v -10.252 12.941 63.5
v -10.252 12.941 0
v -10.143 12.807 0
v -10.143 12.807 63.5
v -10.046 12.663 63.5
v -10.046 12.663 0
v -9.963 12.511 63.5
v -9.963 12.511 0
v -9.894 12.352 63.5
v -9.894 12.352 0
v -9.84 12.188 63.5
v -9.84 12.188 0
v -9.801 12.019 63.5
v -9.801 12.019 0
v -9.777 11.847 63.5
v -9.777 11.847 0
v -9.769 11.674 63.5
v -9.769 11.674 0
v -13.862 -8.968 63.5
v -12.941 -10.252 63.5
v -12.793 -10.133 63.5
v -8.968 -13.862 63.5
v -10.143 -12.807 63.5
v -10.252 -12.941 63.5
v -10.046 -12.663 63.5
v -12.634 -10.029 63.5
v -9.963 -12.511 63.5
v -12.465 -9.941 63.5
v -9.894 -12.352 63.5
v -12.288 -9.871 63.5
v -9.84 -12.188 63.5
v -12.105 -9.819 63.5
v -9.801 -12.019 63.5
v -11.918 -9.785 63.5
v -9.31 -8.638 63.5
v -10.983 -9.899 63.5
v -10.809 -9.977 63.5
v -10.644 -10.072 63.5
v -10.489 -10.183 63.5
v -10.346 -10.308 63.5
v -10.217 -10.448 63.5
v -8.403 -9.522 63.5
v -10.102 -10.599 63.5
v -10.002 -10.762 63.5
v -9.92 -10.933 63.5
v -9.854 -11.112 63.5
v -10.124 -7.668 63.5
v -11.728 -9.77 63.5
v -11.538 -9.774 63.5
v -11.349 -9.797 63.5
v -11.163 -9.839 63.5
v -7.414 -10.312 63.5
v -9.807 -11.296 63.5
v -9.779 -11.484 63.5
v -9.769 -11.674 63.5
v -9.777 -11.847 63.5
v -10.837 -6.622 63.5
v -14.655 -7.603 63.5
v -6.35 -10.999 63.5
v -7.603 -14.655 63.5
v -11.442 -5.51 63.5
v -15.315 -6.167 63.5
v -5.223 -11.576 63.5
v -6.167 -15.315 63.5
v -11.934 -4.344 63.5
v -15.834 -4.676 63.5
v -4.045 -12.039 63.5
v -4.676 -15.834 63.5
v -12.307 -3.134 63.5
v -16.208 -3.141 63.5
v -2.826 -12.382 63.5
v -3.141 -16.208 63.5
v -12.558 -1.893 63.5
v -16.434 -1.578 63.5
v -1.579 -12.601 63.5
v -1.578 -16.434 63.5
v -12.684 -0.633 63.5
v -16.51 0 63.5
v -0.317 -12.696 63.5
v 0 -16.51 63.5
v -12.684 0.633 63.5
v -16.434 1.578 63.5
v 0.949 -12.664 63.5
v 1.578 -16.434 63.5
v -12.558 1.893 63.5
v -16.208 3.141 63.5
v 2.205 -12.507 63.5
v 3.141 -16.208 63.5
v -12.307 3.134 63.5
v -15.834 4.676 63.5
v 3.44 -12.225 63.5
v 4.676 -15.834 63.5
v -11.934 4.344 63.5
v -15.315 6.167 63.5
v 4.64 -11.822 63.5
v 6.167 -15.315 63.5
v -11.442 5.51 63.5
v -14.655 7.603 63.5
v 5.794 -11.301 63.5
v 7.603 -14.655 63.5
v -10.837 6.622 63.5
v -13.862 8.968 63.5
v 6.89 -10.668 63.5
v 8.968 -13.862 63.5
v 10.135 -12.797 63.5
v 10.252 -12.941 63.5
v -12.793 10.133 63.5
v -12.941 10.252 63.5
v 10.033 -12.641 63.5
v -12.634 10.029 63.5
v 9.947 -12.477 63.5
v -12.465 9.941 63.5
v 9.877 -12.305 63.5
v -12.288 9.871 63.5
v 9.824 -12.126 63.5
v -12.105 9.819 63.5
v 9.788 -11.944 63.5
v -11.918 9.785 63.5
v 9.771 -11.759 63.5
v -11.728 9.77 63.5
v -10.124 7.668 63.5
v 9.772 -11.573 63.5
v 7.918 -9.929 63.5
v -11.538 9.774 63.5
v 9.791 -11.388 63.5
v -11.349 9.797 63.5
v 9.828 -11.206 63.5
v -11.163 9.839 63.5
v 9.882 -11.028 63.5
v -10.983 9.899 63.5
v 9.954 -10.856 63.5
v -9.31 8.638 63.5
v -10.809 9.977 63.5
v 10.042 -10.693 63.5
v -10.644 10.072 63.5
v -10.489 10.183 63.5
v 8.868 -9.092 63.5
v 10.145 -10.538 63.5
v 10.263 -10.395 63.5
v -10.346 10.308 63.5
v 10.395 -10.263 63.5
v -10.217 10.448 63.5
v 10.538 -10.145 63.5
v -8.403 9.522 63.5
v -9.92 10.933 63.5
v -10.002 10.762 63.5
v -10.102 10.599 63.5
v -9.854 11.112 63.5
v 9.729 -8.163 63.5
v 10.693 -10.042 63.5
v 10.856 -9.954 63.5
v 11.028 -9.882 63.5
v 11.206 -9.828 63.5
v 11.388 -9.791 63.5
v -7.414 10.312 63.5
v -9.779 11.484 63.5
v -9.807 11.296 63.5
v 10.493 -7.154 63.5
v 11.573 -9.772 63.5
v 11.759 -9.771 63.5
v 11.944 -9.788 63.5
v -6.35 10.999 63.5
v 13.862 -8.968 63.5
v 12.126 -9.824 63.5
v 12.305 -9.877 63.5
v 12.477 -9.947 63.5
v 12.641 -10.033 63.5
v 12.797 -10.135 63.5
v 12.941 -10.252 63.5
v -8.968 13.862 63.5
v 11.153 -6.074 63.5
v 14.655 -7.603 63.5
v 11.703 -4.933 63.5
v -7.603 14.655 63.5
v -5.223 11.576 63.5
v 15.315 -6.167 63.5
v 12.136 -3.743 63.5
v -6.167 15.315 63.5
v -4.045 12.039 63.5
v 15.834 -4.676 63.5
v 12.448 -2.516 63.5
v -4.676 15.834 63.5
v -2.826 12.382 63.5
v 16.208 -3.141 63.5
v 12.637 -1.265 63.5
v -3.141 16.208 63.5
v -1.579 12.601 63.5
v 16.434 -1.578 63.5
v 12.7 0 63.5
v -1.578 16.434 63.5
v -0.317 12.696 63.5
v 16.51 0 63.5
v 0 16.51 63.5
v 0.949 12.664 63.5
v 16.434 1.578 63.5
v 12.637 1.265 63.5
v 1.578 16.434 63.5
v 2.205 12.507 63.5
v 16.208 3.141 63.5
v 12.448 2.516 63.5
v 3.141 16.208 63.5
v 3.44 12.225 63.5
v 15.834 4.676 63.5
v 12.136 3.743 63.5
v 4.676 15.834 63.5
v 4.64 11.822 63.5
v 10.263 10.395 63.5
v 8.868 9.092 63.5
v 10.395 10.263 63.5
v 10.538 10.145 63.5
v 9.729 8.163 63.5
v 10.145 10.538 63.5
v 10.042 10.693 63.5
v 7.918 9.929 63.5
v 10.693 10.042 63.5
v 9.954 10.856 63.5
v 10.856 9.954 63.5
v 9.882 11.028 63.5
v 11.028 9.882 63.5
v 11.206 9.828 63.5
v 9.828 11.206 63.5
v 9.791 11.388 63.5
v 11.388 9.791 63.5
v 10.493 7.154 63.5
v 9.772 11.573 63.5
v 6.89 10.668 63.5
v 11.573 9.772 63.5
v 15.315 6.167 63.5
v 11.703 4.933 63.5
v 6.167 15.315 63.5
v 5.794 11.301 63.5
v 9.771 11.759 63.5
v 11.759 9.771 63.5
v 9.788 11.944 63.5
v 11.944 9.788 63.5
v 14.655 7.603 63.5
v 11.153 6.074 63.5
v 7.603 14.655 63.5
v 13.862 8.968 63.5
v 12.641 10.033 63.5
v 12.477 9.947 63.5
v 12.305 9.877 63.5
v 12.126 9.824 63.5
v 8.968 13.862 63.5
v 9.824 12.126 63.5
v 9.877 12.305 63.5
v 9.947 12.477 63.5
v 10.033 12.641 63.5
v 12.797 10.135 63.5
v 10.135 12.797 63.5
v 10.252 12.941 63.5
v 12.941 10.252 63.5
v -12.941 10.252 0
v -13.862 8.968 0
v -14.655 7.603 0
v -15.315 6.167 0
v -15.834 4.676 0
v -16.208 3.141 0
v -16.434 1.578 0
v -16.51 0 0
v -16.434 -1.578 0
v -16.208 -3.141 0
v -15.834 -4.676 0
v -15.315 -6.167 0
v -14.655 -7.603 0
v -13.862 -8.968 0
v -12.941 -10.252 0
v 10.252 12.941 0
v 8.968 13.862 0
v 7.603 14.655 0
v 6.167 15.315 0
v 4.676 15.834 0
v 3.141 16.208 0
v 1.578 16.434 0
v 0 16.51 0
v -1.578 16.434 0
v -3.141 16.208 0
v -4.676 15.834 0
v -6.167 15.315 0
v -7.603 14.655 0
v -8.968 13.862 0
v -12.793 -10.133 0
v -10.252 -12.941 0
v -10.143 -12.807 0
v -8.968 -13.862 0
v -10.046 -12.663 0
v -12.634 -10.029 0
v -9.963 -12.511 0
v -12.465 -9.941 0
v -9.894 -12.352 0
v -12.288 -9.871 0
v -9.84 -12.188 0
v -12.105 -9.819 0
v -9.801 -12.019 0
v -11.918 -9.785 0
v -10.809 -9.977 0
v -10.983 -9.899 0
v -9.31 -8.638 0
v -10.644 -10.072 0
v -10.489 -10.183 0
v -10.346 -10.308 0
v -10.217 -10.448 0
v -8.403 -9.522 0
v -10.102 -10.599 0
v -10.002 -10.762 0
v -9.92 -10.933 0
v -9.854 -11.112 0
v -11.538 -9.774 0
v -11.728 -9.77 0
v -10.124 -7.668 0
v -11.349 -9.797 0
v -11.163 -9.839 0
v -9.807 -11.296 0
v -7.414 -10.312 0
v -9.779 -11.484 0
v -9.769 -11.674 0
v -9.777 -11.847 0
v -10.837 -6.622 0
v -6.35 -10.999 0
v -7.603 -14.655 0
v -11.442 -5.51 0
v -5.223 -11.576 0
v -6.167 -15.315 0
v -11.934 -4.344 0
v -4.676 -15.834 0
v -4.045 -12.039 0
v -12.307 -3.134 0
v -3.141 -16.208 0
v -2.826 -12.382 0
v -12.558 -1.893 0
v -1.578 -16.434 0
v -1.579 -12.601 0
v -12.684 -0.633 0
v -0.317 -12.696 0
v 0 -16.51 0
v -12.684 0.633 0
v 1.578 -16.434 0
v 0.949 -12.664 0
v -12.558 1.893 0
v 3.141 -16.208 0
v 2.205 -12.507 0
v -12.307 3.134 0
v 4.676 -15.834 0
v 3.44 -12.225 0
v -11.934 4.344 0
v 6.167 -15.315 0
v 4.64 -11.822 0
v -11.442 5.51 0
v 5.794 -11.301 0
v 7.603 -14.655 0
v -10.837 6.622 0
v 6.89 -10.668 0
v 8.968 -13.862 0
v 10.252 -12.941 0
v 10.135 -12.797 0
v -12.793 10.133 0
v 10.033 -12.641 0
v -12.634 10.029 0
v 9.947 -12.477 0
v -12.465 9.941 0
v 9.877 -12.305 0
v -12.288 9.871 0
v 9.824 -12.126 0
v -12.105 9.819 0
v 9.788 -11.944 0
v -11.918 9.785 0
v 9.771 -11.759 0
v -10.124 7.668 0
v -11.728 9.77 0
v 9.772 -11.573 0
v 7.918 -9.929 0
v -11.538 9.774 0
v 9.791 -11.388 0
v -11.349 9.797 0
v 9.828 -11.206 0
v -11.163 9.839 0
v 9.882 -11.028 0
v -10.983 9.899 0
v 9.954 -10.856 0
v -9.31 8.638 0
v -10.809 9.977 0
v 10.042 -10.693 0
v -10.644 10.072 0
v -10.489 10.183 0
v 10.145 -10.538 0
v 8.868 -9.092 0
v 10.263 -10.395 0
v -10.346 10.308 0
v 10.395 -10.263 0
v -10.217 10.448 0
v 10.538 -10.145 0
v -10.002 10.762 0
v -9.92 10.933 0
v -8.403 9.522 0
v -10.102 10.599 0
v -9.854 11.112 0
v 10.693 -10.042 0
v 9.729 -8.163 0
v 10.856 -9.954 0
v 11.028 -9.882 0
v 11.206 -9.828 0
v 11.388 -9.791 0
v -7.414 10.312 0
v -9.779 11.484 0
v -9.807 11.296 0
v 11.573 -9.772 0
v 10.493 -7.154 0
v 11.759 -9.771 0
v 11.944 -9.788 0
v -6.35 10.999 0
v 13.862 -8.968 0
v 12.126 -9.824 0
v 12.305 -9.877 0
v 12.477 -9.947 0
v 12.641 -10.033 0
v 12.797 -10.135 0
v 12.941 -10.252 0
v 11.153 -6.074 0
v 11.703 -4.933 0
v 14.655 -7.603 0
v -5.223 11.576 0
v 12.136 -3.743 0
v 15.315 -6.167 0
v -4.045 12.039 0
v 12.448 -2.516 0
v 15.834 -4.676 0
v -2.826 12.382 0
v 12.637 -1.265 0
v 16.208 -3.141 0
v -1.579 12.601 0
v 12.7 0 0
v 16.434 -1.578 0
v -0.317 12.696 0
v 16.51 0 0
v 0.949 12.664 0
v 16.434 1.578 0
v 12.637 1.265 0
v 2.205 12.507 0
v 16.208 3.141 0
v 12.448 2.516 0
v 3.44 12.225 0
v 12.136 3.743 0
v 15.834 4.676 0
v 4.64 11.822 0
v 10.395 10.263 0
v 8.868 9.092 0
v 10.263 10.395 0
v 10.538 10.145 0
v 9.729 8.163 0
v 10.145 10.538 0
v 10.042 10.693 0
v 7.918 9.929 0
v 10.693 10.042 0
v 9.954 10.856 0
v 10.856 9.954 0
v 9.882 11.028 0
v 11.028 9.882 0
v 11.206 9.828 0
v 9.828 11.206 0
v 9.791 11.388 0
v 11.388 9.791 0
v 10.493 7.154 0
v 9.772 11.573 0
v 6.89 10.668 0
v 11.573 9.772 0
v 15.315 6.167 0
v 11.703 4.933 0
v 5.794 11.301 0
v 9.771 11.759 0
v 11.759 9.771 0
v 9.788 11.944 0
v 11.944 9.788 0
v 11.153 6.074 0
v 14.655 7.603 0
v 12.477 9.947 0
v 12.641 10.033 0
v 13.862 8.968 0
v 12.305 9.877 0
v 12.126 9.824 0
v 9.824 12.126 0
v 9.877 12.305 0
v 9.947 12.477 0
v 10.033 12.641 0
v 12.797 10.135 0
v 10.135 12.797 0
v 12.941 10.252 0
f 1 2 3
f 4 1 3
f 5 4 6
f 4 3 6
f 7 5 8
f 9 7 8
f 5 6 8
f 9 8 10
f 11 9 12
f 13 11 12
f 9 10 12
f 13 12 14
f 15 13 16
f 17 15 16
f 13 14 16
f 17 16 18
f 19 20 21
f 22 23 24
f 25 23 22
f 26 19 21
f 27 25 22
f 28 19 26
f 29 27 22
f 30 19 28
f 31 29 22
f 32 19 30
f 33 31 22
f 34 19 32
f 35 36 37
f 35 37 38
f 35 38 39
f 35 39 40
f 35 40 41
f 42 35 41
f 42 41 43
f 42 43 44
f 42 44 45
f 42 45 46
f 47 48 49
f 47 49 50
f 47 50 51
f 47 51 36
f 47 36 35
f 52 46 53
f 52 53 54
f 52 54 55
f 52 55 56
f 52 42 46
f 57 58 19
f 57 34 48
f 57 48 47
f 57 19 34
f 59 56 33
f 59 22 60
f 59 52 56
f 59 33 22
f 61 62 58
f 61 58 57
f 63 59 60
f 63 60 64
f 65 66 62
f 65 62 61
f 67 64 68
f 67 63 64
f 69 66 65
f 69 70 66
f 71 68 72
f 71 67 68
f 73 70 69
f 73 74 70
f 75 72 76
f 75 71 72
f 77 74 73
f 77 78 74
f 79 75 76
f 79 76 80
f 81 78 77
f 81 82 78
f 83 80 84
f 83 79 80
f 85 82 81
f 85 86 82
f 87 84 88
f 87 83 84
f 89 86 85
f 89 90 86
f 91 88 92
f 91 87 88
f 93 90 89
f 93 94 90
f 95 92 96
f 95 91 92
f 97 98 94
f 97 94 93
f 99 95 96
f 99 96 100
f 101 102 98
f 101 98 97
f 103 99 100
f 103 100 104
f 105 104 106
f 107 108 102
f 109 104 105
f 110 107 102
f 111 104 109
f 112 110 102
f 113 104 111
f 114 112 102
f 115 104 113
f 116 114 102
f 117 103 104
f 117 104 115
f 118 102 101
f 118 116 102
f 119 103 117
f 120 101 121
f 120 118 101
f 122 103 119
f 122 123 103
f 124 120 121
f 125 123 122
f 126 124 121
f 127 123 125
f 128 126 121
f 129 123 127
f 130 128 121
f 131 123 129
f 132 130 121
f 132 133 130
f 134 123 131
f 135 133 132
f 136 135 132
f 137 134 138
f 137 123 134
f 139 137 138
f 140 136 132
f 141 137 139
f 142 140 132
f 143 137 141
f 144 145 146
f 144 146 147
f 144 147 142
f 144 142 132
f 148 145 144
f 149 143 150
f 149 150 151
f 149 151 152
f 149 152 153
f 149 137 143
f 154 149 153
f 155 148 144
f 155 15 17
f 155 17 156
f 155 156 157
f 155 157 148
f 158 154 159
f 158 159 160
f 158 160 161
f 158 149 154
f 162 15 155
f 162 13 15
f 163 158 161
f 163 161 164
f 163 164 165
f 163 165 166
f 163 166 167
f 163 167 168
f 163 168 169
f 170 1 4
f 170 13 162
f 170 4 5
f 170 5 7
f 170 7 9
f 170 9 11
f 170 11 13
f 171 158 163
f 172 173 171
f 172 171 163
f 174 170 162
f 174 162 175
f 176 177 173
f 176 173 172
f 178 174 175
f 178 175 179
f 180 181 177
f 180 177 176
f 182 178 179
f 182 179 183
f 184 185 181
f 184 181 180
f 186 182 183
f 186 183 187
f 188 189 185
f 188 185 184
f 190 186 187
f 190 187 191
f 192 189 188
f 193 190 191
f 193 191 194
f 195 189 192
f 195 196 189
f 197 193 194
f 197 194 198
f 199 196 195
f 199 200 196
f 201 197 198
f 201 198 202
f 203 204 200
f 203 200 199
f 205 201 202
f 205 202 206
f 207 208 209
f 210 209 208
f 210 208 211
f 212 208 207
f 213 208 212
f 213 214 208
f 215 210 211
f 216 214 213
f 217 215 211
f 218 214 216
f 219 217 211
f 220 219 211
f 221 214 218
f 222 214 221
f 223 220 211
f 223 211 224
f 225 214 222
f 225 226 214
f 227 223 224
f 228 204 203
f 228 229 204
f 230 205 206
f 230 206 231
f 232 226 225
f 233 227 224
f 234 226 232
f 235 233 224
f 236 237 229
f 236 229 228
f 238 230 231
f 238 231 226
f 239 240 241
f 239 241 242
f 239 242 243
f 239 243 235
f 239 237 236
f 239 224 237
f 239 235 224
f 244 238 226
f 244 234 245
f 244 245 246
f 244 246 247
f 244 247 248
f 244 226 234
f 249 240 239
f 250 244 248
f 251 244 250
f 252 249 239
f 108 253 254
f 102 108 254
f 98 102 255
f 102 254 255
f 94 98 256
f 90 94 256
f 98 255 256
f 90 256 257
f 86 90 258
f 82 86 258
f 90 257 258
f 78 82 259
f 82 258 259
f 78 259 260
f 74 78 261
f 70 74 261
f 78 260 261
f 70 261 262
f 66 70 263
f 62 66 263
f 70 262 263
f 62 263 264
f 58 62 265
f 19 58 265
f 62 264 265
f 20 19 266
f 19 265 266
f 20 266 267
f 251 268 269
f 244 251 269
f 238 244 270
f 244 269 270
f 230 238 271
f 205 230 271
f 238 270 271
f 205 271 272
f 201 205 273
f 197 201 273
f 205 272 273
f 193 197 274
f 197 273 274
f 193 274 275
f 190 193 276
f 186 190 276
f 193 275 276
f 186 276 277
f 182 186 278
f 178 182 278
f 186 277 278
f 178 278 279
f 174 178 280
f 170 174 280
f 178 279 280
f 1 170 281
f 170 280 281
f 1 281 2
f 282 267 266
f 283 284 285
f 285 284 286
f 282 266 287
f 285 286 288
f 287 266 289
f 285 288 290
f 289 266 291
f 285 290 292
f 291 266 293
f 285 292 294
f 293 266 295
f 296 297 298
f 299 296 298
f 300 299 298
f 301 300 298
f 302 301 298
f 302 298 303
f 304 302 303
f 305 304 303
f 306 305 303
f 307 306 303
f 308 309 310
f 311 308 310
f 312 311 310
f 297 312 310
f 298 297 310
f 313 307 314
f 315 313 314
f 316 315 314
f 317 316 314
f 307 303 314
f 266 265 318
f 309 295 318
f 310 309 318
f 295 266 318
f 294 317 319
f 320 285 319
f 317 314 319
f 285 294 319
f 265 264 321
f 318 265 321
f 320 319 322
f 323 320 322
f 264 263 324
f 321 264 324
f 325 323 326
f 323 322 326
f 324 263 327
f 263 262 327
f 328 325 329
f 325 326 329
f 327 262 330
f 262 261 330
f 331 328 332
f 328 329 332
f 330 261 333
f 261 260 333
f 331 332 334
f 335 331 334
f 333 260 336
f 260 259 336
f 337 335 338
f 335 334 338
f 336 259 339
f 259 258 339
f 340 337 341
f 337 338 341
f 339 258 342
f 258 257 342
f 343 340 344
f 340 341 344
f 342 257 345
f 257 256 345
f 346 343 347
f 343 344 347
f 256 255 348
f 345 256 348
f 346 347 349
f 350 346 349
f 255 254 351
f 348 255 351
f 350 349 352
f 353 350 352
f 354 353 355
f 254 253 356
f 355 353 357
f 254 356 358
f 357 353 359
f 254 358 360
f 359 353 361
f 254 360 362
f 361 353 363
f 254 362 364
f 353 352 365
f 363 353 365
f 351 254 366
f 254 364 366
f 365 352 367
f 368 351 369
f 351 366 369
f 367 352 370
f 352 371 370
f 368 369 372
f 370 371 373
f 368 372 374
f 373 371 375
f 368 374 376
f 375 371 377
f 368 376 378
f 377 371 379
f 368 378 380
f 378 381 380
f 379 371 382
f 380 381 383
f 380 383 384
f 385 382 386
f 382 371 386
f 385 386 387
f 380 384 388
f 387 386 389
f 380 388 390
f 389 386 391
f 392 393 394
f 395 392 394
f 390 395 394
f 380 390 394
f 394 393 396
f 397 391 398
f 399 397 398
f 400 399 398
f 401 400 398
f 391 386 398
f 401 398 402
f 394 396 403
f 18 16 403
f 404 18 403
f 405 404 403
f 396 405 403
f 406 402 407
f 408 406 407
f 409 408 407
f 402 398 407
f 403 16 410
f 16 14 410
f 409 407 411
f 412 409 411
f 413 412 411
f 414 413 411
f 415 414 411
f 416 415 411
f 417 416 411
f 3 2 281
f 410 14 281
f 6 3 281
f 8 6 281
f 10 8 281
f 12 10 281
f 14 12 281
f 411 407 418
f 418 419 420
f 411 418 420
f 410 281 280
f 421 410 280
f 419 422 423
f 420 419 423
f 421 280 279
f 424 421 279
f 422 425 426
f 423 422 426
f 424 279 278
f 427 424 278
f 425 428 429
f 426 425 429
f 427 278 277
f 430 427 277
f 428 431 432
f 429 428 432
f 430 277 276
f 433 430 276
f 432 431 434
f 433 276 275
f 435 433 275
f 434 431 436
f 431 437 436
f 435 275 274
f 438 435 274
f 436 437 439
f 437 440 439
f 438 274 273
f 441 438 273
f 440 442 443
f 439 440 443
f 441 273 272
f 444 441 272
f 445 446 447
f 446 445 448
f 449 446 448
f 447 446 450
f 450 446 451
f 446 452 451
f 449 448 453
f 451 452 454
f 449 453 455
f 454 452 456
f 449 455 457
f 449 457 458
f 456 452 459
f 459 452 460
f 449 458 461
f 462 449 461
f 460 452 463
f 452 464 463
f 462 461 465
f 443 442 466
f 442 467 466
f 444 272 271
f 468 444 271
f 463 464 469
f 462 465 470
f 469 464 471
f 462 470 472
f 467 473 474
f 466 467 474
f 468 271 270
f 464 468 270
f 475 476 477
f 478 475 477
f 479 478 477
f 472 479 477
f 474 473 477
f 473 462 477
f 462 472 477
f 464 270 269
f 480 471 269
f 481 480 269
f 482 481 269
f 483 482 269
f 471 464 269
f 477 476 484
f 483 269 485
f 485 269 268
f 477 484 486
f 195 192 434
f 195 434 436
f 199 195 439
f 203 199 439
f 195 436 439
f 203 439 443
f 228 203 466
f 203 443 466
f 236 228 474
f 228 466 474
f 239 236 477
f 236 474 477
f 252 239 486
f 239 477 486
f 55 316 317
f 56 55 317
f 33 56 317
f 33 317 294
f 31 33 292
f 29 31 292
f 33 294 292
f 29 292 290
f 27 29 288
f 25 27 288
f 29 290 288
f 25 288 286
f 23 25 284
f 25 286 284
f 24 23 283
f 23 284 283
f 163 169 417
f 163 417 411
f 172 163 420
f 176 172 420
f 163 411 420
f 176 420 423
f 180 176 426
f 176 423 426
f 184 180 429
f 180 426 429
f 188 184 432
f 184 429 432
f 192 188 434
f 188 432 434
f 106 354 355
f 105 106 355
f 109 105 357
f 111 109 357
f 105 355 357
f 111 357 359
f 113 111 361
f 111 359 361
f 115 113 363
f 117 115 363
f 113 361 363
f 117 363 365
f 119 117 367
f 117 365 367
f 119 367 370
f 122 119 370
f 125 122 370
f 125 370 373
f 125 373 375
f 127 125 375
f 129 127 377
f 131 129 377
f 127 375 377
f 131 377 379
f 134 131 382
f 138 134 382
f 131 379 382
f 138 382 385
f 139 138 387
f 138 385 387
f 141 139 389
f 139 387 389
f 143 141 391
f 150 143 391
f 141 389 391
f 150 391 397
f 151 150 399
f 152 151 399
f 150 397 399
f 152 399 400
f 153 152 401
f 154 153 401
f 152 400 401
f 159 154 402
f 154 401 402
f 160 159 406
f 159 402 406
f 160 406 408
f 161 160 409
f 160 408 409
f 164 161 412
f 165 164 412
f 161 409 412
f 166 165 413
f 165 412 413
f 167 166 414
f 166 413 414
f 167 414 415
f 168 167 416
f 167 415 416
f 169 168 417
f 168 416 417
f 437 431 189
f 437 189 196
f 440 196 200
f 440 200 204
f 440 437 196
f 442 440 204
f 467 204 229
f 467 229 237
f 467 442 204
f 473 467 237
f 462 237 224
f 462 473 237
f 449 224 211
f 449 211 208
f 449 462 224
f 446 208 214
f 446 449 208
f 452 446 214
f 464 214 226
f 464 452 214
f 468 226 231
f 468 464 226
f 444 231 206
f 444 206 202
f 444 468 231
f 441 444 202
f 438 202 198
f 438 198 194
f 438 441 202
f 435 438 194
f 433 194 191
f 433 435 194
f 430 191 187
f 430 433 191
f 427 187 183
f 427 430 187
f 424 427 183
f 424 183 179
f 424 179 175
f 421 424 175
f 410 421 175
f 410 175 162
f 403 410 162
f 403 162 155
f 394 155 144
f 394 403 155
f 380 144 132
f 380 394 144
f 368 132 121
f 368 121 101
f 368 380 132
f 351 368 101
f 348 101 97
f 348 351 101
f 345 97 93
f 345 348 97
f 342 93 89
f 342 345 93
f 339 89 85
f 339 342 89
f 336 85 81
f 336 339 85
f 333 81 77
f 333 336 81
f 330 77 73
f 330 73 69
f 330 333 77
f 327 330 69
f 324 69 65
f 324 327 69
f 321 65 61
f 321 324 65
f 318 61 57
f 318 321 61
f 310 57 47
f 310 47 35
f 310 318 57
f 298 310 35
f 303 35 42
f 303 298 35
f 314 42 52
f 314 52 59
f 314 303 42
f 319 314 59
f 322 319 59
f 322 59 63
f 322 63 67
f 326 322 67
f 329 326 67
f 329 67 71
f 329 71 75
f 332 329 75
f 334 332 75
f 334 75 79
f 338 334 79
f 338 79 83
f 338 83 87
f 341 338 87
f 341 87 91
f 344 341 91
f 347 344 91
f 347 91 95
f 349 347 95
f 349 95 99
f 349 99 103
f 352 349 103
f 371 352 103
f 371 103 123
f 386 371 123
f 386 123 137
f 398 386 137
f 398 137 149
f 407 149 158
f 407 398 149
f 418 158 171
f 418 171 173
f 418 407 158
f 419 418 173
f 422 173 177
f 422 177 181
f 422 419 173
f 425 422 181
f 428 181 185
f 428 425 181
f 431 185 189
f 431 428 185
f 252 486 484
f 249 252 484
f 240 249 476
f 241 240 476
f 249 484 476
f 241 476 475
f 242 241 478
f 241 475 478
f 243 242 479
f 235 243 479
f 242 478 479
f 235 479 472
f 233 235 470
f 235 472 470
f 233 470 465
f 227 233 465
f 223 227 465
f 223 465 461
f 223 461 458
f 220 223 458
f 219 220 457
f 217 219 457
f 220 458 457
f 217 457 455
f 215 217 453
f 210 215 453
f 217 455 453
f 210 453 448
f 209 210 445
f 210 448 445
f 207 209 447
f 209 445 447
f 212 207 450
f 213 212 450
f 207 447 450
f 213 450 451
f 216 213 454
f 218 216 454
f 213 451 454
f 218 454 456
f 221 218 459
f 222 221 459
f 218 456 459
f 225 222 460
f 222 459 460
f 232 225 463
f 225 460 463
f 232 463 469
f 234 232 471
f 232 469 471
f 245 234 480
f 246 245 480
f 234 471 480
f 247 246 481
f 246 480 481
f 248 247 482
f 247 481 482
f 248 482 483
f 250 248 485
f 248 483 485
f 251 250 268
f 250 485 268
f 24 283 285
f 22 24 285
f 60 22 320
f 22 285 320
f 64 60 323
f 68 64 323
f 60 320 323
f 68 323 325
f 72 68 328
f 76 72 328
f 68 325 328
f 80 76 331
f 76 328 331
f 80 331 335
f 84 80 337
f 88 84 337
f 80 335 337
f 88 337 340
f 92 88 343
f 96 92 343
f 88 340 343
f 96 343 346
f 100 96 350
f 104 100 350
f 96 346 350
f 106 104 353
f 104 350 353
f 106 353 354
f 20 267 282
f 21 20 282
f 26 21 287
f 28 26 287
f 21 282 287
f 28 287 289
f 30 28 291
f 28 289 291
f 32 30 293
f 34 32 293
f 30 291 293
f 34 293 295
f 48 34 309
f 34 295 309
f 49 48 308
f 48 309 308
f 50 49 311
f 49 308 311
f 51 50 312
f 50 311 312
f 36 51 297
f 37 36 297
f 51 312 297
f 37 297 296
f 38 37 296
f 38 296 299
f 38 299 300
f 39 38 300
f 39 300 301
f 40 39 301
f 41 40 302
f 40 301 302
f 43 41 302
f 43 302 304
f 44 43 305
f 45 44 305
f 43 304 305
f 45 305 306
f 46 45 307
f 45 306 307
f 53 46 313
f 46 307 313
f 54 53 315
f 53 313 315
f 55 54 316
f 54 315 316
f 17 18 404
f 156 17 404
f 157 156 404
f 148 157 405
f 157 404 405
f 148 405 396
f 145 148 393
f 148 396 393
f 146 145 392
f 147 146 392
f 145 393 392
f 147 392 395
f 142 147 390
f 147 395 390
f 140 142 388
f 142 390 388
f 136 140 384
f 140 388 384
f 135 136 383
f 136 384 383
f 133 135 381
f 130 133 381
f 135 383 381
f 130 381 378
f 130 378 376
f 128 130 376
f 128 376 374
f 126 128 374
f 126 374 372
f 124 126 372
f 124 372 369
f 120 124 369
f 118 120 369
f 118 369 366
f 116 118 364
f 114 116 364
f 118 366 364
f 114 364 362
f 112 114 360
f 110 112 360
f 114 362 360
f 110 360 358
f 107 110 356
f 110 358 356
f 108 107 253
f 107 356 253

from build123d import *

# Parameters (mm, degrees)
F0_R     = 12.7
F1_DEPTH = 63.5


with BuildPart() as f1:
    # F0 (on Top) → F1 (new body)
    with BuildSketch(Plane.XY):
        with BuildLine():
            ThreePointArc((12.941414, -10.251824), (15.592351, -5.427585), (16.51, 0))
            ThreePointArc((16.51, 0), (15.592351, 5.427585), (12.941414, 10.251824))
            ThreePointArc((12.941414, 10.251824), (10.327295, 10.327295), (10.251824, 12.941414))
            ThreePointArc((10.251824, 12.941414), (0, 16.51), (-10.251824, 12.941414))
            ThreePointArc((-10.251824, 12.941414), (-9.894038, 12.352251), (-9.769333, 11.674333))
            ThreePointArc((-9.769333, 11.674333), (-10.894835, 9.936113), (-12.941414, 10.251824))
            ThreePointArc((-12.941414, 10.251824), (-16.51, 0), (-12.941414, -10.251824))
            ThreePointArc((-12.941414, -10.251824), (-10.894835, -9.936113), (-9.769333, -11.674333))
            ThreePointArc((-9.769333, -11.674333), (-9.894038, -12.352251), (-10.251824, -12.941414))
            ThreePointArc((-10.251824, -12.941414), (0, -16.51), (10.251824, -12.941414))
            ThreePointArc((10.251824, -12.941414), (10.327295, -10.327295), (12.941414, -10.251824))
        make_face()
        Circle(F0_R, mode=Mode.SUBTRACT)
    extrude(amount=F1_DEPTH)


solid = f1.part
